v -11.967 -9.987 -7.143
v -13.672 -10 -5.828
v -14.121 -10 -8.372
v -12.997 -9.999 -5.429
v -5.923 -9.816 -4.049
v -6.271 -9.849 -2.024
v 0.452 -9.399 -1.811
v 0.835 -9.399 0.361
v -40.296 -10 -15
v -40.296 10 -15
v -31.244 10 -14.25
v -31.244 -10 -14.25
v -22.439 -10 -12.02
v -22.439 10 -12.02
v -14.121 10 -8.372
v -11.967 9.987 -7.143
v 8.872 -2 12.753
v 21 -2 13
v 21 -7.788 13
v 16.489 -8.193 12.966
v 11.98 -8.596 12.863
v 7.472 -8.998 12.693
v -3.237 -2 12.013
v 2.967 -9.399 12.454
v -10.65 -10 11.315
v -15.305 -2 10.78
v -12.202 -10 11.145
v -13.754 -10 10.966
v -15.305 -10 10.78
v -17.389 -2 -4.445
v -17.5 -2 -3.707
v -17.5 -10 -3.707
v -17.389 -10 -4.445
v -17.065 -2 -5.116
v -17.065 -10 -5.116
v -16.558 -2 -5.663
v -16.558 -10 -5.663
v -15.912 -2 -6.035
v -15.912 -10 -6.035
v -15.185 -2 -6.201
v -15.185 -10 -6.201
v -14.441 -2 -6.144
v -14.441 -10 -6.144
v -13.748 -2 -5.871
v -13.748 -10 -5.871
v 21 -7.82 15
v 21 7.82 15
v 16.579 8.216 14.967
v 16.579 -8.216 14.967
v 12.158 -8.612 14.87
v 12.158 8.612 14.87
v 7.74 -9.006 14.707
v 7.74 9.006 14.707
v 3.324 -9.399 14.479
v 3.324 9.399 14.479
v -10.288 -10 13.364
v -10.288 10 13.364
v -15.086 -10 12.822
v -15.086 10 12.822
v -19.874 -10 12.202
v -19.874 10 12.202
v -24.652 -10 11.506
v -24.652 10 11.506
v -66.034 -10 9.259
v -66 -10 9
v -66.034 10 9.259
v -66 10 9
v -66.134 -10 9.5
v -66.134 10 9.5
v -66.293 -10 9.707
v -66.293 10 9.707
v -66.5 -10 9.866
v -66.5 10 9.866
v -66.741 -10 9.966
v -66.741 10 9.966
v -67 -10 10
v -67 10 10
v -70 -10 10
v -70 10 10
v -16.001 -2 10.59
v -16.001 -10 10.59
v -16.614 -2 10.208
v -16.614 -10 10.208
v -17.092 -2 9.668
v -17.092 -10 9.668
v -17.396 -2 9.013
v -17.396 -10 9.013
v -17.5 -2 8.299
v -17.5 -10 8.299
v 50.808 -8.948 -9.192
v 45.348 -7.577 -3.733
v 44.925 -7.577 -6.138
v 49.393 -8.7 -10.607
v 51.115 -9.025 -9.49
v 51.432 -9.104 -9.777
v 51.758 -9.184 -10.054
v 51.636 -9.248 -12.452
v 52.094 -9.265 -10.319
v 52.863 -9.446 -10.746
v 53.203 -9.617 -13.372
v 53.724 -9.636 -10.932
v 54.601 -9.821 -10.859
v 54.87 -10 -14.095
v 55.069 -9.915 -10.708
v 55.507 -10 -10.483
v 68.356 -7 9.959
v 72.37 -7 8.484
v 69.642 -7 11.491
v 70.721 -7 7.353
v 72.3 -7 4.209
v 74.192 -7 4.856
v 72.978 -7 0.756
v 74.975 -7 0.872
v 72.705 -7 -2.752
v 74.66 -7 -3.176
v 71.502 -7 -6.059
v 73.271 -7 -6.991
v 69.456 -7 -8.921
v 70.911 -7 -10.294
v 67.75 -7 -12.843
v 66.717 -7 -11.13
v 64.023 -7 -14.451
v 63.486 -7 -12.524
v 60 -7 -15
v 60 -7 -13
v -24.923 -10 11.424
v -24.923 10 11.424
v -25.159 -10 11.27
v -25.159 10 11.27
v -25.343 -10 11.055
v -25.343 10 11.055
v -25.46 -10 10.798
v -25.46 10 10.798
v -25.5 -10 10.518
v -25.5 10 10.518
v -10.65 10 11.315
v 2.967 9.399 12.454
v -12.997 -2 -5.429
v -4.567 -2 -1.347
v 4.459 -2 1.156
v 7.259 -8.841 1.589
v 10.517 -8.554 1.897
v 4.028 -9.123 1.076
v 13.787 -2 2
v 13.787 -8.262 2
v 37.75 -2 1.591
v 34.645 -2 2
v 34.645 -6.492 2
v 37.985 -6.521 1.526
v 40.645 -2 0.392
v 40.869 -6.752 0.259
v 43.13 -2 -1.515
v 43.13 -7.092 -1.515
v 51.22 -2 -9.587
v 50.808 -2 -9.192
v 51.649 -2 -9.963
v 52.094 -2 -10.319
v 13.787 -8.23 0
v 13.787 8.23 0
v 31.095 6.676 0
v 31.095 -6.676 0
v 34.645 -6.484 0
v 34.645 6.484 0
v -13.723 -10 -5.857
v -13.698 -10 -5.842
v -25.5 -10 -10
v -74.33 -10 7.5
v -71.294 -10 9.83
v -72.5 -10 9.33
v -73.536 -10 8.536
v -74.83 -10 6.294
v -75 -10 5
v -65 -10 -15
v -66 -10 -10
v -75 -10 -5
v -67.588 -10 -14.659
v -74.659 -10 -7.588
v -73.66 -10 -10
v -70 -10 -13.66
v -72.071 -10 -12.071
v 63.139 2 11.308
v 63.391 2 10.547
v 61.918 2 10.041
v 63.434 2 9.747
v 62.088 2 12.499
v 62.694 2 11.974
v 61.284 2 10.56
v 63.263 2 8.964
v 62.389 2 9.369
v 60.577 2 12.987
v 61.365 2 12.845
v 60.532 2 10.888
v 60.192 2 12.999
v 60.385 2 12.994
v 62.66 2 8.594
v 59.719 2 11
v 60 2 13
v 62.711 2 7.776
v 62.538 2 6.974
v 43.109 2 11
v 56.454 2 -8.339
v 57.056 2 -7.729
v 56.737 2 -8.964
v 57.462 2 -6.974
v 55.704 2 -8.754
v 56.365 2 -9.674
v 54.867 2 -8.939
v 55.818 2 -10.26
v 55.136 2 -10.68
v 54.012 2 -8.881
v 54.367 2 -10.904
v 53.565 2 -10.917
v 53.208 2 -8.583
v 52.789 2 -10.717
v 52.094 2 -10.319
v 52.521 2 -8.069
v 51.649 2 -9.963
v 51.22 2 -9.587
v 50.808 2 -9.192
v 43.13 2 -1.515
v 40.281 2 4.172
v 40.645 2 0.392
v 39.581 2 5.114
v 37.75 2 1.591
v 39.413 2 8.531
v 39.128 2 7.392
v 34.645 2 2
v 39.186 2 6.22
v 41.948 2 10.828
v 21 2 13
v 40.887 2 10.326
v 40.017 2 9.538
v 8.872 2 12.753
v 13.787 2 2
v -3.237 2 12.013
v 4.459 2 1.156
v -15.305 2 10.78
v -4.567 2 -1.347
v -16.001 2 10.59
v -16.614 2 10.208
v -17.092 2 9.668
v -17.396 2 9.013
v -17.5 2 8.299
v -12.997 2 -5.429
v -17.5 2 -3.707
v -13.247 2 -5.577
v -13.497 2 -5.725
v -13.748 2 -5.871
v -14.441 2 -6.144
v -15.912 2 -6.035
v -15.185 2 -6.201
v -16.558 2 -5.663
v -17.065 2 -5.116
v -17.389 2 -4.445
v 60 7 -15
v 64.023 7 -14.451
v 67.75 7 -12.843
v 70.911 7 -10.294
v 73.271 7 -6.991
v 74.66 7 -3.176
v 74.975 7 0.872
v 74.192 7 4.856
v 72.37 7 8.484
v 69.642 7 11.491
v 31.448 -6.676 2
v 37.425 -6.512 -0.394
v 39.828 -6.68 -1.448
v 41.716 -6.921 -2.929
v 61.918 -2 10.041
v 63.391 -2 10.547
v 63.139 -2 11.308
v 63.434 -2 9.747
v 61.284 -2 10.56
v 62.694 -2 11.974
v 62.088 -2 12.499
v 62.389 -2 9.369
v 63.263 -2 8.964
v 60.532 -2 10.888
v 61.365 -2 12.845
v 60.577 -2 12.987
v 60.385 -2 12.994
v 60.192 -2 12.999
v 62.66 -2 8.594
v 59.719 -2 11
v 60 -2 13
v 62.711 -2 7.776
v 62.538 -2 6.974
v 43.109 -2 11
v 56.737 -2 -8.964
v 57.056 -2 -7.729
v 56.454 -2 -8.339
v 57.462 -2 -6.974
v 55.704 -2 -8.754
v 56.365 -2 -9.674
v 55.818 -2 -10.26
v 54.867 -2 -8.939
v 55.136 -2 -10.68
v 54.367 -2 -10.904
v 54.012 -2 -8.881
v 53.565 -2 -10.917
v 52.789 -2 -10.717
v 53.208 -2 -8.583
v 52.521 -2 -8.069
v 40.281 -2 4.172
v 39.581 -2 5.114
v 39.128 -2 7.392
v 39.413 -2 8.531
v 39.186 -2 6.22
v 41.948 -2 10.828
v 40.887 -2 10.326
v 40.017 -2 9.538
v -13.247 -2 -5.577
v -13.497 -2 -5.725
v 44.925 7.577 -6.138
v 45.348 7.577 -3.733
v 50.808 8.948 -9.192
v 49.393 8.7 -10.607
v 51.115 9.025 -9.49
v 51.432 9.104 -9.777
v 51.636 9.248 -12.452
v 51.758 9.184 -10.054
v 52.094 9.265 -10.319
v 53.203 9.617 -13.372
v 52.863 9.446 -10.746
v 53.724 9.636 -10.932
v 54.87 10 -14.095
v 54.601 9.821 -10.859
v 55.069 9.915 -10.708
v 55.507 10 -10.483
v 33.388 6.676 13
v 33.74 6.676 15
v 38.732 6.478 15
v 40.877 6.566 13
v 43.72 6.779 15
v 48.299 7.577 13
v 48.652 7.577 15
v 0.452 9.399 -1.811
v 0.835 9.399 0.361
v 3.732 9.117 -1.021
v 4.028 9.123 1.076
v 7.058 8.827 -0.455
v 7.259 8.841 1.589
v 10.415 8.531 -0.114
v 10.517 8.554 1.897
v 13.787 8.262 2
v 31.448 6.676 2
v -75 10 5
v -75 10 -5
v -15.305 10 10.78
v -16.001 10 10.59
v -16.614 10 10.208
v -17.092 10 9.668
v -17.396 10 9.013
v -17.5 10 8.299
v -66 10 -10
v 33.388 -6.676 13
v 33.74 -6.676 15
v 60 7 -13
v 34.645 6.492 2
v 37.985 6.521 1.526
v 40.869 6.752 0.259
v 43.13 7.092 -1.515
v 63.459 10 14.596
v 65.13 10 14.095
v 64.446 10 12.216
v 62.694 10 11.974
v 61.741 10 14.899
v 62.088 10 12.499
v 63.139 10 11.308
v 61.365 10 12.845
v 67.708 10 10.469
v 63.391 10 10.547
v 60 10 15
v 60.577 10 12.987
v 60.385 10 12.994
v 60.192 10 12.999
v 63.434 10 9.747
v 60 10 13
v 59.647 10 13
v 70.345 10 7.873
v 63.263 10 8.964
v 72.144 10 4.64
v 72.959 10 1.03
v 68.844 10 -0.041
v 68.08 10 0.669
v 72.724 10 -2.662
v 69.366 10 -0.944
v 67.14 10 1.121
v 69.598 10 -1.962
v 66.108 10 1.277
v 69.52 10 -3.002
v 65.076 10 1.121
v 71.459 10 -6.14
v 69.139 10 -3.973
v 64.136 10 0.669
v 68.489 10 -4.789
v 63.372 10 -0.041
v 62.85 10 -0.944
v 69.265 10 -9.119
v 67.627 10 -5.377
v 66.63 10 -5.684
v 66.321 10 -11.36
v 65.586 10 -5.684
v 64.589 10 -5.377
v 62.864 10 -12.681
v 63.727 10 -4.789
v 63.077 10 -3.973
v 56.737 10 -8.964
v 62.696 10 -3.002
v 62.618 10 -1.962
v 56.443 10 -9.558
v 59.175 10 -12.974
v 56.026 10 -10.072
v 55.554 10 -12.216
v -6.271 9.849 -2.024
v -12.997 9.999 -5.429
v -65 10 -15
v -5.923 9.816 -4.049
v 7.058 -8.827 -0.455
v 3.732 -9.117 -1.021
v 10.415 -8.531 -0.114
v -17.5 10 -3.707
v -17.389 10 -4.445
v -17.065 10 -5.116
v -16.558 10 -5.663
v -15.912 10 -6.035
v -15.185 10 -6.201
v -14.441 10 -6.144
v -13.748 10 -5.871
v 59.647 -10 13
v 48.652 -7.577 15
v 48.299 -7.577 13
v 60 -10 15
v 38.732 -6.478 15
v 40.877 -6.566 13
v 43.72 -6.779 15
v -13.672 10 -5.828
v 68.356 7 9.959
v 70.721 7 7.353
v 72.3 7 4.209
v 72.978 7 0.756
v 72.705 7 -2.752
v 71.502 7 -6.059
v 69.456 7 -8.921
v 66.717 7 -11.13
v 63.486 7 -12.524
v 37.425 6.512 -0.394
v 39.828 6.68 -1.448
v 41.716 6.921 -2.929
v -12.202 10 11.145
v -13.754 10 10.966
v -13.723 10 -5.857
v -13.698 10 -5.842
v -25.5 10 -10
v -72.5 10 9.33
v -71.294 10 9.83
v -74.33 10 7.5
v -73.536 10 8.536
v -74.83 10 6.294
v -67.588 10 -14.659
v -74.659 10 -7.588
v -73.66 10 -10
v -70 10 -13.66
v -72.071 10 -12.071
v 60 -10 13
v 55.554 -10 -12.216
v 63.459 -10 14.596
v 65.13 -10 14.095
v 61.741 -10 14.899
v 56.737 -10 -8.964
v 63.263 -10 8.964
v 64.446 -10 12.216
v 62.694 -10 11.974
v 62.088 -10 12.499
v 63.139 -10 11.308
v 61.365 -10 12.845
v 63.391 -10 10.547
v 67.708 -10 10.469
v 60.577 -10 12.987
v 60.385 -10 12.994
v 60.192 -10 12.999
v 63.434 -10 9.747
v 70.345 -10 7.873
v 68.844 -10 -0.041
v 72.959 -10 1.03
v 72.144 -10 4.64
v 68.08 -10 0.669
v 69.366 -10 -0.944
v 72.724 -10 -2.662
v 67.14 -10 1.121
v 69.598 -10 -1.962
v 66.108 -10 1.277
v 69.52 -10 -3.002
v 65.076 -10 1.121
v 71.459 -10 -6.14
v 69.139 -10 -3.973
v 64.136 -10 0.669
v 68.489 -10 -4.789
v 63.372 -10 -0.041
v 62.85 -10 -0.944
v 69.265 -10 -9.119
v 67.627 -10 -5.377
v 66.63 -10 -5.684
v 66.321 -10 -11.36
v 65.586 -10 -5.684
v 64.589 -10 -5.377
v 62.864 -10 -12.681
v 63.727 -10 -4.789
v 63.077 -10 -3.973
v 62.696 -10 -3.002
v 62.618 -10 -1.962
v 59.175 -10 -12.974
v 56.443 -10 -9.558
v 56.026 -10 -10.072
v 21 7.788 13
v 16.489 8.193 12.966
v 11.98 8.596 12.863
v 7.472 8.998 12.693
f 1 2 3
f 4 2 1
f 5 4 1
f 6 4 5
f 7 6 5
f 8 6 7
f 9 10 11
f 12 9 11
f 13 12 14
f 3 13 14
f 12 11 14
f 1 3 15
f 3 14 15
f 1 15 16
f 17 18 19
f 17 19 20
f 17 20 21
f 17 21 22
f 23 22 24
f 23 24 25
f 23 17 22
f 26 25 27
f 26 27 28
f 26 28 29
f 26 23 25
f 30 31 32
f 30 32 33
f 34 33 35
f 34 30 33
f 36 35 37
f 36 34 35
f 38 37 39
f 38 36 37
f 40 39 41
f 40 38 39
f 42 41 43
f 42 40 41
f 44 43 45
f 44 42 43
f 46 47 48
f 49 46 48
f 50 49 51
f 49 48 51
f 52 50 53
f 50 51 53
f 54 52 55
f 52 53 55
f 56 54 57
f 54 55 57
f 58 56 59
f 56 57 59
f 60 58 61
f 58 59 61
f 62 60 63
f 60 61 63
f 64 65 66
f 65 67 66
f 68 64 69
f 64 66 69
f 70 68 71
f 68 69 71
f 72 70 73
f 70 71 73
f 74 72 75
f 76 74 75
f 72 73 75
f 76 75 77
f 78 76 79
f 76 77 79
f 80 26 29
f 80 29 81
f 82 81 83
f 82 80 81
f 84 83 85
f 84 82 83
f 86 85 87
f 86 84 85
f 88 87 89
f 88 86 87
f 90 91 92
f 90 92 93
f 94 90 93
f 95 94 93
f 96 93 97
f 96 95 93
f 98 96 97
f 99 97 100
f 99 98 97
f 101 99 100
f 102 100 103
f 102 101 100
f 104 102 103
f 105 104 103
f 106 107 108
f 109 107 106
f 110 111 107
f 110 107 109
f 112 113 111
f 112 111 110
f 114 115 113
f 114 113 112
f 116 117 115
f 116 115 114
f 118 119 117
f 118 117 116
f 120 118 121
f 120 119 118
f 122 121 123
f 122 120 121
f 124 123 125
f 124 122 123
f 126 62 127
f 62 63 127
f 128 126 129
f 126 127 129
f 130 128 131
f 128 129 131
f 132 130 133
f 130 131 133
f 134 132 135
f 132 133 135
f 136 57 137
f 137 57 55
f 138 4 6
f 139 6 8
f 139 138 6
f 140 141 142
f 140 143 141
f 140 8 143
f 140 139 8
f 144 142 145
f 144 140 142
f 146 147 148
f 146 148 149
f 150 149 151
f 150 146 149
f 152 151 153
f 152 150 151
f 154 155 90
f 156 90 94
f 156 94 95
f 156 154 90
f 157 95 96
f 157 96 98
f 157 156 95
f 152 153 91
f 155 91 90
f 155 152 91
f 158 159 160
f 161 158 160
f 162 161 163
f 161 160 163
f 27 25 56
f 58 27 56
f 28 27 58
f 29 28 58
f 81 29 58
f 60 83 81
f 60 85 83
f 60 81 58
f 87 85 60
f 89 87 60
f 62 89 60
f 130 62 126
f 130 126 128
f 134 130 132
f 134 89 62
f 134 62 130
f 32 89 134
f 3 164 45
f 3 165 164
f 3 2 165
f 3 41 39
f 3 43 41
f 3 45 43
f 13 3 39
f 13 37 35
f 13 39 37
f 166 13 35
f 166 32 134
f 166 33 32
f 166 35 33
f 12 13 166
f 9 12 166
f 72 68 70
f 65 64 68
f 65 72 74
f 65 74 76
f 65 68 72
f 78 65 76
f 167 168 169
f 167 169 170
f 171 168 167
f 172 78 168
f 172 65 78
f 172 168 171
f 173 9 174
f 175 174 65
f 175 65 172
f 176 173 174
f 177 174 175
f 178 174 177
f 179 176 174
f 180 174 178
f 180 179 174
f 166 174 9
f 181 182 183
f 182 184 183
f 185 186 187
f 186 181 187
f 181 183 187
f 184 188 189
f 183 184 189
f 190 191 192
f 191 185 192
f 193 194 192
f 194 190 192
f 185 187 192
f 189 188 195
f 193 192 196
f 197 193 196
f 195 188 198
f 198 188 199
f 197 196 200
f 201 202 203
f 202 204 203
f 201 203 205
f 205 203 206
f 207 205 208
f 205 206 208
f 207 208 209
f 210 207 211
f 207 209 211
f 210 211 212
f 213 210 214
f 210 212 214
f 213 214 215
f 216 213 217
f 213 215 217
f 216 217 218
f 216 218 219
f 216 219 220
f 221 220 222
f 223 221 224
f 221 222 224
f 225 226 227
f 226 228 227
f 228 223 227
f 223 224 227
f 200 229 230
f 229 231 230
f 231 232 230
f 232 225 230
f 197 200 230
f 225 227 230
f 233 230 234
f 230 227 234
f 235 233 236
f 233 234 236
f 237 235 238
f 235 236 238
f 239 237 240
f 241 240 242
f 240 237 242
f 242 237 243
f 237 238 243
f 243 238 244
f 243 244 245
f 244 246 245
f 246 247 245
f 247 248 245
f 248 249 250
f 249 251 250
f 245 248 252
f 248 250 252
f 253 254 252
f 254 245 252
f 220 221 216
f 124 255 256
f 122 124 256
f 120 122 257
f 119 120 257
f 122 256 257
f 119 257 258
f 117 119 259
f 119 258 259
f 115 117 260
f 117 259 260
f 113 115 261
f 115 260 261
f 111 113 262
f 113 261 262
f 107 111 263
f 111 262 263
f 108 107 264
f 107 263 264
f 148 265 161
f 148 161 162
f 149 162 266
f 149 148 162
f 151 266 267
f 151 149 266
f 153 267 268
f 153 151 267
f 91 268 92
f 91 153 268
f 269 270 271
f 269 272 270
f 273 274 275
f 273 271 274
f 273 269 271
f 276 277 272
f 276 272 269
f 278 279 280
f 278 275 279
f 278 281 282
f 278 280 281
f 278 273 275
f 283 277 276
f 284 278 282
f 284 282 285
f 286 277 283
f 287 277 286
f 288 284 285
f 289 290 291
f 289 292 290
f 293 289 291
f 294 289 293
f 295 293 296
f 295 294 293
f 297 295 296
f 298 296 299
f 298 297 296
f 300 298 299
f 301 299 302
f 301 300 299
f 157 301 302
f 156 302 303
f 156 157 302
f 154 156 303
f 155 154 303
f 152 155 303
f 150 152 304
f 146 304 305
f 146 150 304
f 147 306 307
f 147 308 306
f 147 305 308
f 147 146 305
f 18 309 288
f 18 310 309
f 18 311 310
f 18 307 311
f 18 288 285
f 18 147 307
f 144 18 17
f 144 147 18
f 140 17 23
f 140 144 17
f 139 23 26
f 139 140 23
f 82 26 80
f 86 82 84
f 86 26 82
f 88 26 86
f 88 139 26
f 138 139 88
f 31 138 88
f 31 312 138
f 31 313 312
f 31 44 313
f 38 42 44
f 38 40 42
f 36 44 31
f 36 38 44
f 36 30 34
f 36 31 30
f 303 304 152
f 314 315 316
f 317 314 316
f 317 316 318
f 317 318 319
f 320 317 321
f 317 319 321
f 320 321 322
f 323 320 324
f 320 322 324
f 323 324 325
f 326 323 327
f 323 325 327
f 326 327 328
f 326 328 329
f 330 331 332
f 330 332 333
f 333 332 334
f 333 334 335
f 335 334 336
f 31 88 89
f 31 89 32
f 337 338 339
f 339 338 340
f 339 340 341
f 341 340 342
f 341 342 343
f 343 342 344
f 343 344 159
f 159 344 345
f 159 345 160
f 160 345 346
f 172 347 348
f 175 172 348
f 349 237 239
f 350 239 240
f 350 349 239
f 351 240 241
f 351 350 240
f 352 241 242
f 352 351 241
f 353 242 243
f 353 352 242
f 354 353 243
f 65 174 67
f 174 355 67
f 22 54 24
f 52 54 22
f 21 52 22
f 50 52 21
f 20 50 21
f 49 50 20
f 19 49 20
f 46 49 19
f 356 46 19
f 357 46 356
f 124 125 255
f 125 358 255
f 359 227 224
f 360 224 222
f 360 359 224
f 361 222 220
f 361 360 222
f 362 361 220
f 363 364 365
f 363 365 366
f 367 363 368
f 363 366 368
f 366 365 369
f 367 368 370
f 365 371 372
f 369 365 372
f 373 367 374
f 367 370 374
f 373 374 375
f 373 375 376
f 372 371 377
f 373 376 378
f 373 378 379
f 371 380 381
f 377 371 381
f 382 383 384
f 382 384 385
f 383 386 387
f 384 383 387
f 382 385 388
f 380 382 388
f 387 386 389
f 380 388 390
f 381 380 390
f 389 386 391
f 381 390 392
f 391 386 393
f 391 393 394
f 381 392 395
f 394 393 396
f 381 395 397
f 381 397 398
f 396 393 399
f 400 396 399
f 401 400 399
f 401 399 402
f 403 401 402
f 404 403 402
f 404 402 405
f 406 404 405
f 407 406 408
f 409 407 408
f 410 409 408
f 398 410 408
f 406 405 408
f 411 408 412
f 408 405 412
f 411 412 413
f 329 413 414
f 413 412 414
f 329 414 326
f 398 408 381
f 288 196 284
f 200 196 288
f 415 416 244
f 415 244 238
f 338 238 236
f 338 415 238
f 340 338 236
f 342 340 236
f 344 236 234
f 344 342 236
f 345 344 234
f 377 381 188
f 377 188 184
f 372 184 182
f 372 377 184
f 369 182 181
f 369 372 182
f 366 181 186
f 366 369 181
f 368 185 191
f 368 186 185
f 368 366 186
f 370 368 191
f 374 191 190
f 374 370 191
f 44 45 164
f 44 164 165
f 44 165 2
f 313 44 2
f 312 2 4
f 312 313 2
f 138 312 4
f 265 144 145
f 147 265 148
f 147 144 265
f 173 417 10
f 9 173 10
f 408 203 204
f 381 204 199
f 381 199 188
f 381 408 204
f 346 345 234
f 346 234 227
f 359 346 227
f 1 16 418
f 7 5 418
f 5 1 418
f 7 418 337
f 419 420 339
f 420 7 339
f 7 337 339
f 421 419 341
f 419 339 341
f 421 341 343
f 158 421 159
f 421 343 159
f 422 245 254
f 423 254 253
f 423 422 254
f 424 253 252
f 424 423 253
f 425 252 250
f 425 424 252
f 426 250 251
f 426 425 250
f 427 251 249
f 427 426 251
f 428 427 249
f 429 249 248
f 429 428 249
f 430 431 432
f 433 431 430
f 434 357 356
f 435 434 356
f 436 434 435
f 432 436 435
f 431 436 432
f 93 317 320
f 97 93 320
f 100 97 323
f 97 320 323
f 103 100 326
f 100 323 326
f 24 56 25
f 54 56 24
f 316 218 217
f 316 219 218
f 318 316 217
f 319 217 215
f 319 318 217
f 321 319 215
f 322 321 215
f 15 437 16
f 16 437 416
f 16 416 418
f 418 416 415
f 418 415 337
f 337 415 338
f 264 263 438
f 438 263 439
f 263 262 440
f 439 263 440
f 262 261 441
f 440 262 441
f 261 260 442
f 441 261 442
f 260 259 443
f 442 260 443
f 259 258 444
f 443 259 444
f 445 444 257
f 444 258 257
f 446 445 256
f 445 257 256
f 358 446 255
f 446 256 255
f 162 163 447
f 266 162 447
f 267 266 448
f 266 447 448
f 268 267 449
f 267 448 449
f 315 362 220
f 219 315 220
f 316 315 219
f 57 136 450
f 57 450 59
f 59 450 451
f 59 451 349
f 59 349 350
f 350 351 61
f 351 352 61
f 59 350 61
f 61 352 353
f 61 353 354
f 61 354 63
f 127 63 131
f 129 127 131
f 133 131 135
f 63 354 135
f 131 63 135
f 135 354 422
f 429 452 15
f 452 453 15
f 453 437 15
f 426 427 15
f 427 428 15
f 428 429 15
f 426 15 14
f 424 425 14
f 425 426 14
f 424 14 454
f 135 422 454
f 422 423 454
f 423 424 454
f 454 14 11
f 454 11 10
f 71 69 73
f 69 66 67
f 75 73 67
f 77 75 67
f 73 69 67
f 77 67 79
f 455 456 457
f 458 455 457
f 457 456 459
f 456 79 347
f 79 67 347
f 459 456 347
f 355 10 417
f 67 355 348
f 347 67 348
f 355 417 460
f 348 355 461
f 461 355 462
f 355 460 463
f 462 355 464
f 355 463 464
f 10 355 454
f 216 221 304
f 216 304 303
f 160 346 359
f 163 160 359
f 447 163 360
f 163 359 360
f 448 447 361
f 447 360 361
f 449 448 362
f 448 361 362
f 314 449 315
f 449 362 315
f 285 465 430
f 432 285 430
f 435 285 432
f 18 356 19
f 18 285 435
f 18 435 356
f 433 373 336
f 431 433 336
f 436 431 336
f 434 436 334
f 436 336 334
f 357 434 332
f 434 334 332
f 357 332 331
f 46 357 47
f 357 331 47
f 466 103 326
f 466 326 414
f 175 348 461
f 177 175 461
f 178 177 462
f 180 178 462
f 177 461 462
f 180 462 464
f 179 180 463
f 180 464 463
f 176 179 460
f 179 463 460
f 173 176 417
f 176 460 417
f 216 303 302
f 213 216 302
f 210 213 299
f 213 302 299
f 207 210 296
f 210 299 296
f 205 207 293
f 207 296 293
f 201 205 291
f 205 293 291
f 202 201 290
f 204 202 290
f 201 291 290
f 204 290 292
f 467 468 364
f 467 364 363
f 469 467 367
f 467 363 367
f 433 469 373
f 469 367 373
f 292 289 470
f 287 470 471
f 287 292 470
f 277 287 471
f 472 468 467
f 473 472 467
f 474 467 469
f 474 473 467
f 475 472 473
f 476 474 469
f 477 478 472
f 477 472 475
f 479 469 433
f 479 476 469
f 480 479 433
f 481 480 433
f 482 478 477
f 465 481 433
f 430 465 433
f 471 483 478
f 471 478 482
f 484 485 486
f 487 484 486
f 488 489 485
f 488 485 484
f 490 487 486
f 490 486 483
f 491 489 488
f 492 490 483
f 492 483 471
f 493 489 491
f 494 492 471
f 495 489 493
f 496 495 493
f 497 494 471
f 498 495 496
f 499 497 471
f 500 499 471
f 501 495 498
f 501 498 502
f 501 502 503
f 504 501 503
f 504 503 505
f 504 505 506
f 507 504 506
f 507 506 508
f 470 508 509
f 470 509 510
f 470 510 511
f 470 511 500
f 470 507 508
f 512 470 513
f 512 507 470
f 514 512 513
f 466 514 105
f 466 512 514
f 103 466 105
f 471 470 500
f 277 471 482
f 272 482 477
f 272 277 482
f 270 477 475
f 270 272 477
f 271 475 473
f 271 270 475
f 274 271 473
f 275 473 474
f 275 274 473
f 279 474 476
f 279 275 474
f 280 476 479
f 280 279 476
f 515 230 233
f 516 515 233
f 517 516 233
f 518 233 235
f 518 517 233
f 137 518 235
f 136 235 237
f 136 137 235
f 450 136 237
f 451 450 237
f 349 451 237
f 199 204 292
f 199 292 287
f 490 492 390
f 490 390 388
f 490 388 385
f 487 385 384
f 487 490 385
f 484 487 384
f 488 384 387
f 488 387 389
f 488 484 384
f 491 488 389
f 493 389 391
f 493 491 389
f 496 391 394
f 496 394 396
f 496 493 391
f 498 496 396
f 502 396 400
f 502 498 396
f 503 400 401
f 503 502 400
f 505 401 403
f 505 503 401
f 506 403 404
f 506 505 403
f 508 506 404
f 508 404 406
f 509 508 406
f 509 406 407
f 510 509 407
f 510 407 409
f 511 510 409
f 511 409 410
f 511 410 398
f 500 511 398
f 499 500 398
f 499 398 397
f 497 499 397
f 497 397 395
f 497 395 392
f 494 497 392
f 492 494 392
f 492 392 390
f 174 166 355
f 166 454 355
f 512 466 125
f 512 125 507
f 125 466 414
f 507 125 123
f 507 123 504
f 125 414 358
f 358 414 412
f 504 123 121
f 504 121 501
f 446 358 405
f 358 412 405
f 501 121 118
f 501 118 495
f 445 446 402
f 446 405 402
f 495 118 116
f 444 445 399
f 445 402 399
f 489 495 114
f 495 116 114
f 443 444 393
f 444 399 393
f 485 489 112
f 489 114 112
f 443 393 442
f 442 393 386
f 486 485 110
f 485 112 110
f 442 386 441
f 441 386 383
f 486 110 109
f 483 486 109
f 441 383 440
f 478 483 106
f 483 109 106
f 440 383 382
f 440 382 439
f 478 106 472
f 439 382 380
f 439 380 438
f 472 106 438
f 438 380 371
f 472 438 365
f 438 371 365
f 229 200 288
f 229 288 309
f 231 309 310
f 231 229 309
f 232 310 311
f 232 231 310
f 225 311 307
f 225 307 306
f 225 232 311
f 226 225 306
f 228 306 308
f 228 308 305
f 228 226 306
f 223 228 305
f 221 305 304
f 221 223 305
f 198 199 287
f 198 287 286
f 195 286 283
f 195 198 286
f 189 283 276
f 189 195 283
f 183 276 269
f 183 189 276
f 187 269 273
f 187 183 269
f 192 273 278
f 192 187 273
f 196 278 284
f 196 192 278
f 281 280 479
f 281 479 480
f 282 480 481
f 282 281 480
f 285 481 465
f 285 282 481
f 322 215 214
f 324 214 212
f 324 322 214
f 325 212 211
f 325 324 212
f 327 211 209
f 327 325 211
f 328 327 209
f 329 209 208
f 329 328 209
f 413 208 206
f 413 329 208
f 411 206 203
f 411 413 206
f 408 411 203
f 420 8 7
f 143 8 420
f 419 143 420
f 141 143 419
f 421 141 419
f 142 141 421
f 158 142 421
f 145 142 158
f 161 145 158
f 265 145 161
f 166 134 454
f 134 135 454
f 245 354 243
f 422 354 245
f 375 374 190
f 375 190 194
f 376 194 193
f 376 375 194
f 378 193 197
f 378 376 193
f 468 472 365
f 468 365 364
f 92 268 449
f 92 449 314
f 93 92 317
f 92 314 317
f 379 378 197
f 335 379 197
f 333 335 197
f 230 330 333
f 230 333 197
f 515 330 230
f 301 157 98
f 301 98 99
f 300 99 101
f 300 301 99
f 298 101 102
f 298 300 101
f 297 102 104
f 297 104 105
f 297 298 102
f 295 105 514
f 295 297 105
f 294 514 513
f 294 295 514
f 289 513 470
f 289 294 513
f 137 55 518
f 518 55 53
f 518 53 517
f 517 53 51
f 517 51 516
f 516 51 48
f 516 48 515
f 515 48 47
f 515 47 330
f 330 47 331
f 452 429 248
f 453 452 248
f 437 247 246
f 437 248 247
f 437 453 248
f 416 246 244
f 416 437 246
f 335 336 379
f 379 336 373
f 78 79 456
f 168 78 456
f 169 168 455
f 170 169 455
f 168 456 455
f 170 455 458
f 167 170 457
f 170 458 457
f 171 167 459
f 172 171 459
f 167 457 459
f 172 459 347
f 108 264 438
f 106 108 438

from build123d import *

# Parameters (mm, degrees)
CROQUIS1_R              = 3.5
SALIENTE_EXTRUIR1_DEPTH = 2
CROQUIS2_R              = 3.5
SALIENTE_EXTRUIR2_DEPTH = 10
SALIENTE_EXTRUIR3_DEPTH = 7
CORTAR_EXTRUIR1_DEPTH   = 83.665164829


with BuildPart() as part:
    # Croquis1 → Saliente-Extruir1 (new, symmetric)
    with BuildSketch(Plane(origin=(0, 0, 0), x_dir=(1, 0, 0), z_dir=(0, 1, 0))):
        with BuildLine():
            Line((-65, 15), (-40.296472568, 15))
            ThreePointArc((-40.296472568, 15), (-25.597104262, 12.999326141), (-11.967141117, 7.142857143))
            ThreePointArc((-11.967141117, 7.142857143), (0.423734469, 1.818794417), (13.786796564, 0))
            Line((13.786796564, 0), (34.644660941, 0))
            ThreePointArc((34.644660941, 0), (38.471495264, 0.761204675), (41.715728753, 2.928932188))
            Line((41.715728753, 2.928932188), (49.393398282, 10.606601718))
            ThreePointArc((49.393398282, 10.606601718), (51.940505875, 12.650871687), (54.86969785, 14.095389312))
            Line((54.86969785, 14.095389312), (55.553738137, 12.21600407))
            ThreePointArc((55.553738137, 12.21600407), (57.74257369, 12.802500789), (60, 13))
            Line((60, 13), (60, 15))
            ThreePointArc((60, 15), (74.095389312, 5.13030215), (69.641814145, -11.490666647))
            Line((69.641814145, -11.490666647), (68.356238926, -9.958577761))
            ThreePointArc((68.356238926, -9.958577761), (66.5, -11.258330249), (64.446261863, -12.21600407))
            Line((64.446261863, -12.21600407), (65.13030215, -14.095389312))
            ThreePointArc((65.13030215, -14.095389312), (62.604722665, -14.772116295), (60, -15))
            Line((60, -15), (21, -15))
            ThreePointArc((21, -15), (-1.892838305, -14.125254625), (-24.652173913, -11.506119696))
            ThreePointArc((-24.652173913, -11.506119696), (-25.259003924, -11.168852013), (-25.5, -10.517765963))
            Line((-25.5, -10.517765963), (-25.5, 10))
            Line((-25.5, 10), (-66, 10))
            Line((-66, 10), (-66, -9))
            ThreePointArc((-66, -9), (-66.292893219, -9.707106781), (-67, -10))
            Line((-67, -10), (-70, -10))
            ThreePointArc((-70, -10), (-73.535533906, -8.535533906), (-75, -5))
            Line((-75, -5), (-75, 5))
            ThreePointArc((-75, 5), (-72.071067812, 12.071067812), (-65, 15))
        make_face()
        with Locations(Location((66.108002035, 2.223130932, 0), (0, 0, 270))):
            Circle(CROQUIS1_R, mode=Mode.SUBTRACT)
        with BuildLine():
            Line((57.461693581, 6.97393957), (62.538306419, -6.97393957))
            ThreePointArc((62.538306419, -6.97393957), (62.17668469, -9.720729309), (59.719228557, -11))
            Line((59.719228557, -11), (43.108950141, -11))
            ThreePointArc((43.108950141, -11), (39.413432011, -8.530733729), (40.280523016, -4.171572875))
            Line((40.280523016, -4.171572875), (52.521295375, 8.069199484))
            ThreePointArc((52.521295375, 8.069199484), (55.29193456, 8.876767161), (57.461693581, 6.97393957))
        make_face(mode=Mode.SUBTRACT)
    extrude(amount=SALIENTE_EXTRUIR1_DEPTH, both=True)

    # Croquis2 → Saliente-Extruir2 (add, symmetric)
    with BuildSketch(Plane(origin=(0, 0, 0), x_dir=(1, 0, 0), z_dir=(0, 1, 0))):
        with BuildLine():
            Line((54.86969785, 14.095389312), (55.553738137, 12.21600407))
            ThreePointArc((55.553738137, 12.21600407), (72.21600407, 4.446261863), (64.446261863, -12.21600407))
            Line((64.446261863, -12.21600407), (65.13030215, -14.095389312))
            ThreePointArc((65.13030215, -14.095389312), (62.604722665, -14.772116295), (60, -15))
            Line((60, -15), (21, -15))
            ThreePointArc((21, -15), (-1.892838305, -14.125254625), (-24.652173913, -11.506119696))
            ThreePointArc((-24.652173913, -11.506119696), (-25.259003924, -11.168852013), (-25.5, -10.517765963))
            Line((-25.5, -10.517765963), (-25.5, 10))
            Line((-25.5, 10), (-66, 10))
            Line((-66, 10), (-66, -9))
            ThreePointArc((-66, -9), (-66.292893219, -9.707106781), (-67, -10))
            Line((-67, -10), (-70, -10))
            ThreePointArc((-70, -10), (-73.535533906, -8.535533906), (-75, -5))
            Line((-75, -5), (-75, 5))
            ThreePointArc((-75, 5), (-72.071067812, 12.071067812), (-65, 15))
            Line((-65, 15), (-40.296472568, 15))
            ThreePointArc((-40.296472568, 15), (-25.597104262, 12.999326141), (-11.967141117, 7.142857143))
            ThreePointArc((-11.967141117, 7.142857143), (0.423734469, 1.818794417), (13.786796564, 0))
            Line((13.786796564, 0), (34.644660941, 0))
            ThreePointArc((34.644660941, 0), (38.471495264, 0.761204675), (41.715728753, 2.928932188))
            Line((41.715728753, 2.928932188), (49.393398282, 10.606601718))
            ThreePointArc((49.393398282, 10.606601718), (51.940505875, 12.650871687), (54.86969785, 14.095389312))
        make_face()
        with Locations(Location((66.108002035, 2.223130932, 0), (0, 0, 270))):
            Circle(CROQUIS2_R, mode=Mode.SUBTRACT)
        with BuildLine():
            Line((13.786796564, -2), (34.644660941, -2))
            ThreePointArc((34.644660941, -2), (39.236862129, -1.08655439), (43.129942315, 1.514718626))
            Line((43.129942315, 1.514718626), (50.807611845, 9.192388155))
            ThreePointArc((50.807611845, 9.192388155), (51.432121169, 9.777088132), (52.093735288, 10.319446608))
            ThreePointArc((52.093735288, 10.319446608), (54.758810503, 10.817874623), (56.737335776, 8.964096282))
            Line((56.737335776, 8.964096282), (63.262664224, -8.964096282))
            ThreePointArc((63.262664224, -8.964096282), (62.938611682, -11.65594441), (60.57666227, -12.987203726))
            ThreePointArc((60.57666227, -12.987203726), (60.288402114, -12.996800538), (60, -13))
            Line((60, -13), (21, -13))
            ThreePointArc((21, -13), (2.813818289, -12.444554152), (-15.304568528, -10.780287213))
            ThreePointArc((-15.304568528, -10.780287213), (-16.872354309, -9.955498637), (-17.5, -8.298908965))
            Line((-17.5, -8.298908965), (-17.5, 3.707419))
            ThreePointArc((-17.5, 3.707419), (-16.248849159, 5.87314654), (-13.747699378, 5.871152614))
            ThreePointArc((-13.747699378, 5.871152614), (-13.371589613, 5.651403898), (-12.997298625, 5.428571429))
            ThreePointArc((-12.997298625, 5.428571429), (-0.110788015, -0.108453806), (13.786796564, -2))
        make_face(mode=Mode.SUBTRACT)
    extrude(amount=SALIENTE_EXTRUIR2_DEPTH, both=True)

    # Croquis3 → Saliente-Extruir3 (add, symmetric)
    with BuildSketch(Plane(origin=(0, 0, 0), x_dir=(1, 0, 0), z_dir=(0, 1, 0))):
        with BuildLine():
            Line((69.641814145, -11.490666647), (68.356238926, -9.958577761))
            ThreePointArc((68.356238926, -9.958577761), (72.21600407, 4.446261863), (60, 13))
            Line((60, 13), (60, 15))
            ThreePointArc((60, 15), (74.095389312, 5.13030215), (69.641814145, -11.490666647))
        make_face()
    extrude(amount=SALIENTE_EXTRUIR3_DEPTH, both=True)

    # Croquis4 → Cortar-Extruir1 (cut, through all, along a direction that is not the sketch's normal)
    with BuildSketch(Plane.XY.offset(15)):
        with BuildLine():
            Line((60, 10), (-10, 10))
            ThreePointArc((-10, 10), (-3.285105416, 9.849625261), (3.416325828, 9.398802543))
            Line((3.416325828, 9.398802543), (33.740168262, 6.675657889))
            ThreePointArc((33.740168262, 6.675657889), (41.229778106, 6.566394932), (48.651667745, 7.577210532))
            Line((48.651667745, 7.577210532), (60, 10))
        make_face()
        with BuildLine():
            Line((60, -10), (-10, -10))
            ThreePointArc((-10, -10), (-3.285105416, -9.849625261), (3.416325828, -9.398802543))
            Line((3.416325828, -9.398802543), (33.740168262, -6.675657889))
            ThreePointArc((33.740168262, -6.675657889), (41.229778106, -6.566394932), (48.651667745, -7.577210532))
            Line((48.651667745, -7.577210532), (60, -10))
        make_face()
    extrude(amount=-CORTAR_EXTRUIR1_DEPTH, dir=(0.1736481776669275, 0, 0.9848077530122086), mode=Mode.SUBTRACT)


solid = part.part
